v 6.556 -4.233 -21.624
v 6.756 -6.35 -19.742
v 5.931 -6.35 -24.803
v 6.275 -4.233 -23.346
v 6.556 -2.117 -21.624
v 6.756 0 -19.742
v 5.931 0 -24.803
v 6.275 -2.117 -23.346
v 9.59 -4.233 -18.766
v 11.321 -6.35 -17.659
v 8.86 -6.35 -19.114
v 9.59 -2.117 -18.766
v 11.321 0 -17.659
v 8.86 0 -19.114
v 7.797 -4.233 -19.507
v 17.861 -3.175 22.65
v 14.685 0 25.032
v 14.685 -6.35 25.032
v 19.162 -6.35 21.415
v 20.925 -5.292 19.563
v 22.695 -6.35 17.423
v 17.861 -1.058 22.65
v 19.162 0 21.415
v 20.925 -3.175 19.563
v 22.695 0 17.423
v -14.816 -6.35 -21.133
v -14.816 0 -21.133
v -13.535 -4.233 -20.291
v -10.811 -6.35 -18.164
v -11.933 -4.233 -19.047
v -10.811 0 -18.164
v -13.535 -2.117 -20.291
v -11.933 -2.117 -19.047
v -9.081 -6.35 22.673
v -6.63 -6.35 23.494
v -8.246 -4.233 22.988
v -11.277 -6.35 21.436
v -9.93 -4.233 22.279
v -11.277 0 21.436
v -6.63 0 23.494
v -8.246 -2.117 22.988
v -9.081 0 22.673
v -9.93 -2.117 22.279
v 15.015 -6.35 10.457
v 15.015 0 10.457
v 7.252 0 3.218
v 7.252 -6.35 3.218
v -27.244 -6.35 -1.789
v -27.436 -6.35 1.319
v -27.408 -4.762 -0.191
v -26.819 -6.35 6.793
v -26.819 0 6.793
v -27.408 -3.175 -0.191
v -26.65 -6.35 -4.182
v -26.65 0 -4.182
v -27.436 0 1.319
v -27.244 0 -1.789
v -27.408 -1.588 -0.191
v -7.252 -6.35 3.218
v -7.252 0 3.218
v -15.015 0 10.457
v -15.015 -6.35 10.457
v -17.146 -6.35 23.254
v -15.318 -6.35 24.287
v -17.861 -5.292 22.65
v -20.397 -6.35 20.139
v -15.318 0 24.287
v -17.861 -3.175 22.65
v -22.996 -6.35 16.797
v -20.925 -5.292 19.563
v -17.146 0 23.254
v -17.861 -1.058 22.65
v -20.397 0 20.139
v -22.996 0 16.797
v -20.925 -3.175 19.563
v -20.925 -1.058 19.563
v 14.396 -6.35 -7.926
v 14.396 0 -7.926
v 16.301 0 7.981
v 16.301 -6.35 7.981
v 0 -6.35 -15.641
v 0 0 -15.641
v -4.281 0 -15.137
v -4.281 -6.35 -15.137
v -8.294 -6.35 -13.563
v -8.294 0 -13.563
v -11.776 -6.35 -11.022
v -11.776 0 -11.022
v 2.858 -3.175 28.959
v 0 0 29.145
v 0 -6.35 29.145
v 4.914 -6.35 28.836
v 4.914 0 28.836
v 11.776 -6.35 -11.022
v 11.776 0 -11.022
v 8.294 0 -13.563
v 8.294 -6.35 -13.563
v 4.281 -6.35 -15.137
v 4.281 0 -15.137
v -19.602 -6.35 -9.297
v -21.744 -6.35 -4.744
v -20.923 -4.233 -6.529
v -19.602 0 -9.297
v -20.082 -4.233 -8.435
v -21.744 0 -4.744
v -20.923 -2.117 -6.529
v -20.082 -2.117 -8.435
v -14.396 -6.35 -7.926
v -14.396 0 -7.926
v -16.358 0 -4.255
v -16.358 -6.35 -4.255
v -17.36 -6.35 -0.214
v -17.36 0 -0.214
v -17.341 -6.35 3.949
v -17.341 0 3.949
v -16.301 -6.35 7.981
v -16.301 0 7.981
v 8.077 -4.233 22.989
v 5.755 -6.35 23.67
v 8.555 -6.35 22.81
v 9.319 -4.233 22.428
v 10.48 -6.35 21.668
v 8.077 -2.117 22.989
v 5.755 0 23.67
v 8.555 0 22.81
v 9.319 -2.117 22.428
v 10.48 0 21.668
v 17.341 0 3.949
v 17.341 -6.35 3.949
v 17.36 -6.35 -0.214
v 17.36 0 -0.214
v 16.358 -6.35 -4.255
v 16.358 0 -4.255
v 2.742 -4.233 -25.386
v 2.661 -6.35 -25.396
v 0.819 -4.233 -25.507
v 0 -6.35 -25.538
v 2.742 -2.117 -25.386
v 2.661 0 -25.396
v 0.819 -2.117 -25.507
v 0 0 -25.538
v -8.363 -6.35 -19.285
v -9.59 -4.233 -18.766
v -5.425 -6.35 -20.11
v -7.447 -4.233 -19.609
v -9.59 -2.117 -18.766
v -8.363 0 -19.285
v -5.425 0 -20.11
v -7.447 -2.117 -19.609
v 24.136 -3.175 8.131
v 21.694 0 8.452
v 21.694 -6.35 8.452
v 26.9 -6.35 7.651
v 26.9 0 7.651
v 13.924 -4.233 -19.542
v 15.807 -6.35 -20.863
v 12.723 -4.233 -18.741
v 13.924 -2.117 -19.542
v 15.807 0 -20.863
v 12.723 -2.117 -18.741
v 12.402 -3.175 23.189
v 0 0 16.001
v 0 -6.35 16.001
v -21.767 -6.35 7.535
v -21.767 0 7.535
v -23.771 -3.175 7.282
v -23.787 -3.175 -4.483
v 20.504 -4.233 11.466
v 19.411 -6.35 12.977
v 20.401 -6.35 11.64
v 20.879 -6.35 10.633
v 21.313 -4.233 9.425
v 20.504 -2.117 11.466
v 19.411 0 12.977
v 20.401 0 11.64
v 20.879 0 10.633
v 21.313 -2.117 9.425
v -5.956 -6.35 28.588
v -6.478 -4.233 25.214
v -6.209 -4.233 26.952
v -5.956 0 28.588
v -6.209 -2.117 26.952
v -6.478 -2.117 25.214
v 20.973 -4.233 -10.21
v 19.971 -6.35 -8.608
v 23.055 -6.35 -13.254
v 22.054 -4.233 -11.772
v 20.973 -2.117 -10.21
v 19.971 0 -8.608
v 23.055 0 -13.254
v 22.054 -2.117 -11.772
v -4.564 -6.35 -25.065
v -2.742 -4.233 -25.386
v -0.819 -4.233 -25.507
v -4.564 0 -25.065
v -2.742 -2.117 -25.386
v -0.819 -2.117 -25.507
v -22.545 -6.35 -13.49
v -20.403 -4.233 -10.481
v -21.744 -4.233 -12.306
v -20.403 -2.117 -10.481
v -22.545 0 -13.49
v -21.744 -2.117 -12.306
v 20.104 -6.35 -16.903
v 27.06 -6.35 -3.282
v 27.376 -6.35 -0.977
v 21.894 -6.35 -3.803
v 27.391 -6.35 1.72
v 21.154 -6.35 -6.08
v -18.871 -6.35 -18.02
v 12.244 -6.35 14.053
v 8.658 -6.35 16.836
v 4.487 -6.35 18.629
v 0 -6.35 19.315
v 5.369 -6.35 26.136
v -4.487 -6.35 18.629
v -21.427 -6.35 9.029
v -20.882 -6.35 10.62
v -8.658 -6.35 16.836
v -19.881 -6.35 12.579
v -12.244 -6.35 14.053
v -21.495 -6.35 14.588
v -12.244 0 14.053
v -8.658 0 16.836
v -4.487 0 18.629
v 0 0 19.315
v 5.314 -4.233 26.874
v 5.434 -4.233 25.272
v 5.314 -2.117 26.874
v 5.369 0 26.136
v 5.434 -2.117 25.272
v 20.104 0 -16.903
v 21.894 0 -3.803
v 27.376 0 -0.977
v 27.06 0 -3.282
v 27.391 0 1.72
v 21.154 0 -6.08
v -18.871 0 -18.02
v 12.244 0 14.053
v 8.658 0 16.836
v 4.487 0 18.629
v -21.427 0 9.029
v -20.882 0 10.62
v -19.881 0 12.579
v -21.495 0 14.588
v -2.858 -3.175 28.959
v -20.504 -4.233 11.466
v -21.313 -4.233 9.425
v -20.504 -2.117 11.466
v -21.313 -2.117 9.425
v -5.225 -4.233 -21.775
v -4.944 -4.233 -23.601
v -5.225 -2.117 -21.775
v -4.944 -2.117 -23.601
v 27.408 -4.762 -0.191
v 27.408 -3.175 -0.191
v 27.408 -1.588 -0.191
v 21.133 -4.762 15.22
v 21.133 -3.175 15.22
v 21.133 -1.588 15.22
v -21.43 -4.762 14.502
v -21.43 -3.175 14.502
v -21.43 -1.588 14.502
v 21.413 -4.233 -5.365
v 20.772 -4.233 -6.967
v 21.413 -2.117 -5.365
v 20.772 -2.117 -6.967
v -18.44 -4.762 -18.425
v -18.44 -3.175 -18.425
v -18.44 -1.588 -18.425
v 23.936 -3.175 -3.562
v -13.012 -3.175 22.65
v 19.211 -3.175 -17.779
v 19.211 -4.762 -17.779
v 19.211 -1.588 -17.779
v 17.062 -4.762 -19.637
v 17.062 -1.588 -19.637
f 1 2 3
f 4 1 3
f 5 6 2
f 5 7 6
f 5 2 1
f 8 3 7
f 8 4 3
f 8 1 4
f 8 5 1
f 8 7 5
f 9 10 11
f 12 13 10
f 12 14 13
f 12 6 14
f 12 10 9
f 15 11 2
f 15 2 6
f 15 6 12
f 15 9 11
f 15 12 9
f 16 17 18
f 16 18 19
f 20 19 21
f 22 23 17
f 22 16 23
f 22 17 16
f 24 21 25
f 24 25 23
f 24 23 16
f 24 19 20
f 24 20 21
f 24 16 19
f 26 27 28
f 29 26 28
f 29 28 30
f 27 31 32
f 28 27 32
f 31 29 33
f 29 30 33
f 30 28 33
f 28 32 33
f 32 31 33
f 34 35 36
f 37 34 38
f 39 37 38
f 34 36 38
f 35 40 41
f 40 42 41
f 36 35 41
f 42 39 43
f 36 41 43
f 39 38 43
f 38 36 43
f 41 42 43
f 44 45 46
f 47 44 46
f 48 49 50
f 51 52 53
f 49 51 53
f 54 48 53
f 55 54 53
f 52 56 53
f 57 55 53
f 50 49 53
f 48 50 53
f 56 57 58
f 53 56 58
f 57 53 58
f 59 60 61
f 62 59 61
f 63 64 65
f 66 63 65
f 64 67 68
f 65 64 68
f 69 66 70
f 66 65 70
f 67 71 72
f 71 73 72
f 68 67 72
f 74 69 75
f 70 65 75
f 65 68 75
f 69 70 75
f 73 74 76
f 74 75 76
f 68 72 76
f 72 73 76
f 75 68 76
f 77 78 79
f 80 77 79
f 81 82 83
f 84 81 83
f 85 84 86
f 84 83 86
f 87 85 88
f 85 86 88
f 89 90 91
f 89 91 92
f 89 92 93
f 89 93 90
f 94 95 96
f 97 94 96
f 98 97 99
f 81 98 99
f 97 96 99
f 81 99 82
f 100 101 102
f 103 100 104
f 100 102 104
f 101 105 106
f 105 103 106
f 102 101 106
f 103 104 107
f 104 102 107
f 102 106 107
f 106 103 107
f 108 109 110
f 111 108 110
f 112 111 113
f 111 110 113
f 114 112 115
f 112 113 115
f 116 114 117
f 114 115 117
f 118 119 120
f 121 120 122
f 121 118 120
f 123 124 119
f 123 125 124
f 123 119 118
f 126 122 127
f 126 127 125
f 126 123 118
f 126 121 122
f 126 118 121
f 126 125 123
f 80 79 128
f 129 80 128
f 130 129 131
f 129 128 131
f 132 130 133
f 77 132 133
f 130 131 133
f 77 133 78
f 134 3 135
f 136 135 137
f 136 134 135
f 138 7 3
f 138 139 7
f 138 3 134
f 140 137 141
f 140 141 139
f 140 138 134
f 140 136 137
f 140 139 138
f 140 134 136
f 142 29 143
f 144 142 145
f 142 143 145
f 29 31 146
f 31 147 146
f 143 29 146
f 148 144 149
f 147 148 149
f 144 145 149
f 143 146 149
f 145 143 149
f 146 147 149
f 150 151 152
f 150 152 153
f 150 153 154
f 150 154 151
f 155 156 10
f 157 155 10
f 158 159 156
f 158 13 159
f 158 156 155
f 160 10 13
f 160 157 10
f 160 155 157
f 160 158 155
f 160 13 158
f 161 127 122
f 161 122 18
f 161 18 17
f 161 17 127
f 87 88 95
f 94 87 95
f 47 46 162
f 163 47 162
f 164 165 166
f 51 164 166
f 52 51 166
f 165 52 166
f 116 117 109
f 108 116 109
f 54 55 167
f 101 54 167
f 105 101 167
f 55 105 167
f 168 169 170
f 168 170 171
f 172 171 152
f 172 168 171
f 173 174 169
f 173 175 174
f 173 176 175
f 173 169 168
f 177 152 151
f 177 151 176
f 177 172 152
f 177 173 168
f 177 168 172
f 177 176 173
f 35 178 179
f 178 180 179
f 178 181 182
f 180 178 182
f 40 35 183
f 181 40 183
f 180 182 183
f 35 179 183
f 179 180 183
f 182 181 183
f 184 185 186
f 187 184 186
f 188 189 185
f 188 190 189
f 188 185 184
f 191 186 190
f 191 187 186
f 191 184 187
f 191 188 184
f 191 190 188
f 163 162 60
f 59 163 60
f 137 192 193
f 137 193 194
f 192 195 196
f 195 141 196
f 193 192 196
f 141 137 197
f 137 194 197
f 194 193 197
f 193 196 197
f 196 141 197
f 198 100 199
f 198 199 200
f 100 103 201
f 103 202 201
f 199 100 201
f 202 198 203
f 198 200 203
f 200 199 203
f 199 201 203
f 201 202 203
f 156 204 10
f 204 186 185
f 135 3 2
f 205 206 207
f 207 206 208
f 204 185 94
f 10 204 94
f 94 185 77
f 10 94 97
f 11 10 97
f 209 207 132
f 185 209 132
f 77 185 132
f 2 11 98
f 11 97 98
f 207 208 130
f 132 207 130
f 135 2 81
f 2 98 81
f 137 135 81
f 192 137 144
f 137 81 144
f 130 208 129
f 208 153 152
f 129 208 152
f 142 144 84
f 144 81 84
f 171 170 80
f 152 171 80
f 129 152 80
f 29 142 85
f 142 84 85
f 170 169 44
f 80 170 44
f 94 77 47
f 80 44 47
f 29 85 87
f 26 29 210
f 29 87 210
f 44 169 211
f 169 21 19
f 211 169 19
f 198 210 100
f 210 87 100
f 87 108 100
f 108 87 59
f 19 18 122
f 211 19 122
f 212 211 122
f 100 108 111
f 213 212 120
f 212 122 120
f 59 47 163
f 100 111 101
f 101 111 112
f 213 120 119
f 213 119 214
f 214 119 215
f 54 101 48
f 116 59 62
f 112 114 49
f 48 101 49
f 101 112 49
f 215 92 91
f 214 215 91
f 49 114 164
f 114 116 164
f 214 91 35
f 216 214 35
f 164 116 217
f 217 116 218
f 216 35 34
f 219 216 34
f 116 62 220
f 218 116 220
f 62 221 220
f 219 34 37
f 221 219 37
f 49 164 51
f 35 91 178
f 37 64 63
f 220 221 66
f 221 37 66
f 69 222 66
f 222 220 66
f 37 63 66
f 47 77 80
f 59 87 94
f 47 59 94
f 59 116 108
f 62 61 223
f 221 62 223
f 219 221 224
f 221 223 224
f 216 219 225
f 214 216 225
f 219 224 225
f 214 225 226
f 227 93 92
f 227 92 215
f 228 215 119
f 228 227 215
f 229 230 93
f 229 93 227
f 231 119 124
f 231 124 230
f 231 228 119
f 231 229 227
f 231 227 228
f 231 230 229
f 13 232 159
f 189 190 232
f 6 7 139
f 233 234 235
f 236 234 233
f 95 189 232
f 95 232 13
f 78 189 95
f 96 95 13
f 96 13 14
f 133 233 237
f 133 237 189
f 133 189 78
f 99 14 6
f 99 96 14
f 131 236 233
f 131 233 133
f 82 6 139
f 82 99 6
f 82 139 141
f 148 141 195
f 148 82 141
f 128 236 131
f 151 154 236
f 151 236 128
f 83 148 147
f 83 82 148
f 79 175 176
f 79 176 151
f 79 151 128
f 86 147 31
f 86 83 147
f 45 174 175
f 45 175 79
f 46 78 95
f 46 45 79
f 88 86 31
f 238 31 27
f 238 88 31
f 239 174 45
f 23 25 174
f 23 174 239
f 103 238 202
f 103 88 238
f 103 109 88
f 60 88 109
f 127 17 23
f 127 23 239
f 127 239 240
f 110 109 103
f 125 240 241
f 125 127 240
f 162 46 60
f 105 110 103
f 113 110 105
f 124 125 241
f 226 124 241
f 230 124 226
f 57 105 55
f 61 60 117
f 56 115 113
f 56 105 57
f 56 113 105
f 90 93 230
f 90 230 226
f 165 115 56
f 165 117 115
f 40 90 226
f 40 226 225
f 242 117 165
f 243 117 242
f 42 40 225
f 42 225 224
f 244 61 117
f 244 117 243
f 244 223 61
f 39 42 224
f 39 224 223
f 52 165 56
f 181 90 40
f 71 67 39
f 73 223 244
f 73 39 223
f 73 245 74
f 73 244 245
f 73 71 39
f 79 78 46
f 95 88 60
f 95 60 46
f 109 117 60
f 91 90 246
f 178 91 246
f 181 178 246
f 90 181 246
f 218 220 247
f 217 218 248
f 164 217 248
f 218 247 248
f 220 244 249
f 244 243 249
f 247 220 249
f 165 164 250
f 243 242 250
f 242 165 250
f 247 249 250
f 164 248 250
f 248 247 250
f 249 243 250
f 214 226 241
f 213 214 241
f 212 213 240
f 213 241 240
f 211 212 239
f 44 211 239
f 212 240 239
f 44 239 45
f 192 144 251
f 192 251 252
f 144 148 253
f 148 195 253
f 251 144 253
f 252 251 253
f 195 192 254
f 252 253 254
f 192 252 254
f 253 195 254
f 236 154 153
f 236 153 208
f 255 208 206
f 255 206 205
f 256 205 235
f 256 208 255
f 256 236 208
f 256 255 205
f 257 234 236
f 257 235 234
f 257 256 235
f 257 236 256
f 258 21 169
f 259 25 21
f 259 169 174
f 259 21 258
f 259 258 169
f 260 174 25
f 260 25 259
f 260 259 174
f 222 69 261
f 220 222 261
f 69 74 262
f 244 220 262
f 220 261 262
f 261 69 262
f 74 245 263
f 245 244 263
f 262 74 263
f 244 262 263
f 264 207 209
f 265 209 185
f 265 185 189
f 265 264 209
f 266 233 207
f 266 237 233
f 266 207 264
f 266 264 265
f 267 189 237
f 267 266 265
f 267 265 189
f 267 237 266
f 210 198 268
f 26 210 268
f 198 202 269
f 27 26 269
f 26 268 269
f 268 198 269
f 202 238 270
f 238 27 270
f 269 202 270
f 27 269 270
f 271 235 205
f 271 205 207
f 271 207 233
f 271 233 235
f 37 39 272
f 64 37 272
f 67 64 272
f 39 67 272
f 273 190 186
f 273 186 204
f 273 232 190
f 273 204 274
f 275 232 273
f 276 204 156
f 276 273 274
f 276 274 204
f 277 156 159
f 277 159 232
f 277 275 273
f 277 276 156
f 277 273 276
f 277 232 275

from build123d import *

# Parameters (mm, degrees)
F1_DEPTH = 6.35


with BuildPart() as f1:
    # F0 (on Front) → F1 (new body)
    with BuildSketch(Plane.XZ):
        with BuildLine():
            add(Edge.make_bspline(
                [(0, 29.1454624385), (1.0437938543, 29.092111315), (2.9676615883, 28.9021353997), (3.9769254433, 28.960774908), (4.9135610461, 28.8361106068)],
                knots=[0, 0, 0, 0, 0.5411649205, 1, 1, 1, 1], degree=3))
            add(Edge.make_bspline(
                [(0, 29.1454624385), (-0.9437528923, 29.0972246788), (-2.8725435711, 28.9986389771), (-4.9138774721, 28.7269415704), (-5.9563913383, 28.5881850868)],
                knots=[0, 0, 0, 0, 0.4892977256, 1, 1, 1, 1], degree=3))
            add(Edge.make_bspline(
                [(-5.9563913383, 28.5881850868), (-6.0373155006, 28.0471445059), (-6.2016335657, 26.9485512193), (-6.5093200592, 25.2156363617), (-6.5898328104, 24.0659783815), (-6.62991032, 23.4937034547)],
                knots=[0, 0, 0, 0, 0.3276624402, 0.6653248753, 1, 1, 1, 1], degree=3))
            add(Edge.make_bspline(
                [(-6.62991032, 23.4937034547), (-7.1630712073, 23.3361625005), (-8.2499255604, 23.0150135266), (-9.9572225739, 22.336204538), (-10.8475304186, 21.7288015321), (-11.2771932036, 21.435668692)],
                knots=[0, 0, 0, 0, 0.3325381872, 0.6778827649, 1, 1, 1, 1], degree=3))
            add(Edge.make_bspline(
                [(-11.2771932036, 21.435668692), (-11.8350702765, 21.8249692799), (-13.0377139366, 22.6642041338), (-14.5223554917, 23.7203330679), (-15.3183080256, 24.2865495384)],
                knots=[0, 0, 0, 0, 0.4638756196, 1, 1, 1, 1], degree=3))
            add(Edge.make_bspline(
                [(-15.3183080256, 24.2865495384), (-15.7393330058, 24.0996279574), (-16.6177593429, 23.7096348514), (-17.8974724533, 22.6498262533), (-19.4217291693, 21.176610486), (-20.9120929279, 19.6036415161), (-22.2988027199, 17.9964793951), (-22.7815170567, 17.1662651554), (-22.9964256287, 16.7966466397)],
                knots=[0, 0, 0, 0, 0.1470342518, 0.3067721995, 0.488195784, 0.6741675209, 0.8549365796, 1, 1, 1, 1], degree=3))
            add(Edge.make_bspline(
                [(-22.9964256287, 16.7966466397), (-22.7827786963, 16.4290347992), (-22.3389569602, 15.6653724171), (-21.4374221971, 14.5295552957), (-20.4705705808, 13.2063534042), (-20.054743296, 12.7638344348), (-19.881401211, 12.5793656334)],
                knots=[0, 0, 0, 0, 0.2493452916, 0.5179801039, 0.7990648116, 1, 1, 1, 1], degree=3))
            add(Edge.make_bspline(
                [(-19.881401211, 12.5793656334), (-20.0846392768, 12.2431799217), (-20.5544790803, 11.4659956468), (-21.3840934518, 9.4147652747), (-21.6421566332, 8.1490557932), (-21.7672549188, 7.5354925357)],
                knots=[0, 0, 0, 0, 0.2820132239, 0.6519499051, 1, 1, 1, 1], degree=3))
            add(Edge.make_bspline(
                [(-21.7672549188, 7.5354925357), (-22.4007651503, 7.4617805928), (-23.8174591466, 7.2969414761), (-25.7501887359, 6.9725709243), (-26.8186498433, 6.7932507955)],
                knots=[0, 0, 0, 0, 0.4471750661, 1, 1, 1, 1], degree=3))
            add(Edge.make_bspline(
                [(-26.8186498433, 6.7932507955), (-27.0150206584, 5.7106997675), (-27.4153649769, 3.5036856882), (-27.487576028, -0.1420278505), (-27.1724841229, -2.4576482164), (-26.8158489096, -3.6351135415), (-26.6502574086, -4.1818297468)],
                knots=[0, 0, 0, 0, 0.2787464784, 0.5682848997, 0.7995476925, 1, 1, 1, 1], degree=3))
            add(Edge.make_bspline(
                [(-26.6502574086, -4.1818297468), (-25.6482524067, -4.283882262), (-23.7991424402, -4.4630401598), (-22.4348870789, -4.6582824608), (-21.7444170266, -4.7435350716)],
                knots=[0, 0, 0, 0, 0.5418119861, 1, 1, 1, 1], degree=3))
            add(Edge.make_bspline(
                [(-21.7444170266, -4.7435350716), (-21.5301513936, -5.3239807478), (-20.8973837805, -6.4748096374), (-20.1371624634, -8.4217377612), (-19.7523654924, -9.0446974596), (-19.6018647403, -9.2973606661)],
                knots=[0, 0, 0, 0, 0.3651712445, 0.7411436265, 1, 1, 1, 1], degree=3))
            add(Edge.make_bspline(
                [(-19.6018647403, -9.2973606661), (-19.8557043075, -9.6575667806), (-20.3660684195, -10.5039588883), (-21.8038157451, -12.2702435785), (-22.2412676268, -13.1592855453), (-22.545369342, -13.4900901467)],
                knots=[0, 0, 0, 0, 0.3068371792, 0.6931629329, 1, 1, 1, 1], degree=3))
            add(Edge.make_bspline(
                [(-22.545369342, -13.4900901467), (-22.0940668912, -14.1195692007), (-21.0761124198, -15.5394175013), (-18.599436748, -18.5356038568), (-16.1004309615, -20.144341254), (-15.1952966672, -20.8413432762), (-14.8161659017, -21.133294329)],
                knots=[0, 0, 0, 0, 0.2417916314, 0.5453834162, 0.8095761762, 1, 1, 1, 1], degree=3))
            add(Edge.make_bspline(
                [(-14.8161659017, -21.133294329), (-14.4035545557, -20.8762121849), (-13.5164676765, -20.3235027183), (-11.938800627, -19.0453001605), (-11.1645796897, -18.4402777711), (-10.8113959432, -18.1642789394)],
                knots=[0, 0, 0, 0, 0.321074097, 0.6902878978, 1, 1, 1, 1], degree=3))
            add(Edge.make_bspline(
                [(-10.8113959432, -18.1642789394), (-10.4377997552, -18.356428426), (-9.578418285, -18.7984289431), (-7.4377889326, -19.6846188267), (-6.0846706958, -19.9707083991), (-5.4249824025, -20.1101861894)],
                knots=[0, 0, 0, 0, 0.2826999765, 0.6502933629, 1, 1, 1, 1], degree=3))
            add(Edge.make_bspline(
                [(-5.4249824025, -20.1101861894), (-5.3610155769, -20.6541840451), (-5.2299201103, -21.7690690184), (-4.9868161685, -23.6038968225), (-4.700150649, -24.5945667946), (-4.5639569871, -25.0652302057)],
                knots=[0, 0, 0, 0, 0.3334135521, 0.6833073978, 1, 1, 1, 1], degree=3))
            add(Edge.make_bspline(
                [(-4.5639569871, -25.0652302057), (-4.0036224765, -25.1967327146), (-2.7763592192, -25.4257120062), (-0.8901785241, -25.5282377636), (-0.1930272857, -25.4964662667), (0, -25.538245216)],
                knots=[0, 0, 0, 0, 0.3722930601, 0.7521386883, 1, 1, 1, 1], degree=3))
            add(Edge.make_bspline(
                [(5.9308572672, -24.8031578958), (5.2689139487, -24.9585065411), (2.6790443076, -25.4731548763), (0.9559764293, -25.5156687774), (0.1722671255, -25.5009596091), (0, -25.538245216)],
                knots=[0, 0, 0, 0, 0.4398031871, 0.7787962694, 1, 1, 1, 1], degree=3))
            add(Edge.make_bspline(
                [(6.7557585426, -19.7417400777), (6.688428351, -20.314341258), (6.5813657899, -21.6402709566), (6.2935524423, -23.3259978833), (6.0650862164, -24.3392842162), (5.9308572672, -24.8031578958)],
                knots=[0, 0, 0, 0, 0.350944386, 0.6878759656, 1, 1, 1, 1], degree=3))
            add(Edge.make_bspline(
                [(11.3211954013, -17.6592599601), (10.8213650634, -17.9163346998), (9.7584232665, -18.866459568), (7.3118023933, -19.6875722622), (7.1734705952, -19.6534232853), (6.7557585426, -19.7417400777)],
                knots=[0, 0, 0, 0, 0.3782212702, 0.7785671222, 1, 1, 1, 1], degree=3))
            add(Edge.make_bspline(
                [(15.8065371215, -20.8630748093), (15.3251736992, -20.56315591), (13.8665011648, -19.4558100421), (12.7789681935, -18.8303028026), (11.6959509508, -17.9521162845), (11.3211954013, -17.6592599601)],
                knots=[0, 0, 0, 0, 0.3745736215, 0.6713712616, 1, 1, 1, 1], degree=3))
            add(Edge.make_bspline(
                [(23.0551678687, -13.2540129125), (22.5634664887, -13.9398406075), (21.2969886908, -15.5947202126), (19.3865031013, -17.7631830268), (16.5740495299, -19.9562511424), (16.1467053643, -20.6011269916), (15.8065371215, -20.8630748093)],
                knots=[0, 0, 0, 0, 0.2634359256, 0.5400288837, 0.8291456578, 1, 1, 1, 1], degree=3))
            add(Edge.make_bspline(
                [(19.9714973569, -8.6084809154), (20.2495023641, -9.0029785287), (21.011999566, -10.2999652272), (21.9169868652, -11.70396495), (23.0144243441, -12.8465890354), (23.0551678687, -13.2540129125)],
                knots=[0, 0, 0, 0, 0.3360479736, 0.6730359544, 1, 1, 1, 1], degree=3))
            add(Edge.make_bspline(
                [(21.8937862664, -3.8027581759), (21.7035819832, -4.3180216468), (21.4474562337, -5.4083164729), (20.8218480912, -6.8864413809), (20.1707750268, -8.2739301949), (19.9714973569, -8.6084809154)],
                knots=[0, 0, 0, 0, 0.3241636739, 0.6572489225, 1, 1, 1, 1], degree=3))
            add(Edge.make_bspline(
                [(27.0599387586, -3.2821381465), (26.0380611154, -3.3862146566), (23.9300050389, -3.5368732847), (22.5680630159, -3.7195049586), (21.8937862664, -3.8027581759)],
                knots=[0, 0, 0, 0, 0.5525576762, 1, 1, 1, 1], degree=3))
            add(Edge.make_bspline(
                [(26.8997494131, 7.65088154), (27.1242064519, 6.4134970641), (27.3633651924, 3.5787653193), (27.439365489, -0.1607865373), (27.3473887116, -1.3791971203), (27.2348576602, -2.7046266344), (27.0599387586, -3.2821381465)],
                knots=[0, 0, 0, 0, 0.3186146021, 0.6147483075, 0.7882566602, 1, 1, 1, 1], degree=3))
            add(Edge.make_bspline(
                [(21.693546325, 8.4518361837), (22.3789499151, 8.3720862005), (24.304576792, 8.0593863157), (25.7784109563, 8.0113112926), (26.8997494131, 7.65088154)],
                knots=[0, 0, 0, 0, 0.4838049656, 1, 1, 1, 1], degree=3))
            add(Edge.make_bspline(
                [(19.4108262658, 12.9772247747), (19.6651851258, 12.5564777356), (20.683890471, 11.5867833538), (21.2529723436, 9.3224373945), (21.598601005, 8.9175097099), (21.693546325, 8.4518361837)],
                knots=[0, 0, 0, 0, 0.352948459, 0.7358418825, 1, 1, 1, 1], degree=3))
            add(Edge.make_bspline(
                [(22.6947367191, 17.4225196242), (22.4413821761, 16.9865848375), (21.5126588146, 15.8983840367), (21.1662670639, 15.2110067721), (20.3757160555, 14.255874727), (19.6432982612, 13.2246189971), (19.4108262658, 12.9772247747)],
                knots=[0, 0, 0, 0, 0.2956876643, 0.4893521651, 0.730522428, 1, 1, 1, 1], degree=3))
            add(Edge.make_bspline(
                [(14.6851977333, 25.0315796584), (15.2235059004, 24.7925881059), (16.6051459422, 23.5783271475), (17.8795272181, 22.7063806851), (19.3795101389, 21.1942951621), (20.9703035578, 19.602131019), (21.6083627989, 18.5856925536), (22.4685614557, 17.8115155791), (22.6947367191, 17.4225196242)],
                knots=[0, 0, 0, 0, 0.187992975, 0.3461125439, 0.5256980424, 0.7097856138, 0.8473315558, 1, 1, 1, 1], degree=3))
            add(Edge.make_bspline(
                [(10.480189696, 21.667573601), (11.0545698354, 22.0683904419), (12.4507201039, 23.2125696165), (13.9096179326, 24.4798557319), (14.6851977333, 25.0315796584)],
                knots=[0, 0, 0, 0, 0.4775979441, 1, 1, 1, 1], degree=3))
            add(Edge.make_bspline(
                [(5.7545625605, 23.6699581146), (6.3939497446, 23.4810289011), (8.1266642272, 23.0343498509), (9.3072746554, 22.4757967175), (10.0773108512, 21.9424333843), (10.480189696, 21.667573601)],
                knots=[0, 0, 0, 0, 0.3987926726, 0.6979626253, 1, 1, 1, 1], degree=3))
            add(Edge.make_bspline(
                [(4.9135610461, 28.8361106068), (5.0018057445, 28.2461265834), (5.4317244157, 26.8651315663), (5.3164898818, 25.2755494168), (5.7159192748, 24.2217534645), (5.7545625605, 23.6699581146)],
                knots=[0, 0, 0, 0, 0.3573033365, 0.677301645, 1, 1, 1, 1], degree=3))
        make_face()
        with BuildLine():
            ThreePointArc((-14.3957585096, -7.9261912033), (-17.36002773, -0.2137465224), (-16.3007583469, 7.9805590212))
            Line((-16.3007583469, 7.9805590212), (-14.3957585096, -7.9261912033))
        make_face(mode=Mode.SUBTRACT)
        with BuildLine():
            ThreePointArc((0, -15.6414415687), (-6.3381965817, -14.4787839931), (-11.7763839662, -11.0218161717))
            Line((-11.7763839662, -11.0218161717), (0, -11.0218161717))
            Line((0, -11.0218161717), (11.7763839662, -11.0218161717))
            ThreePointArc((11.7763839662, -11.0218161717), (6.3381965817, -14.4787839931), (0, -15.6414415687))
        make_face(mode=Mode.SUBTRACT)
        with BuildLine():
            Line((14.3957585096, -7.9261912033), (16.3007583469, 7.9805590212))
            ThreePointArc((16.3007583469, 7.9805590212), (17.36002773, -0.2137465224), (14.3957585096, -7.9261912033))
        make_face(mode=Mode.SUBTRACT)
        with BuildLine():
            Line((7.2520091198, 3.2180584967), (0, 16.0014592111))
            Line((0, 16.0014592111), (-7.2520091198, 3.2180584967))
            Line((-7.2520091198, 3.2180584967), (-15.0148840621, 10.4570584372))
            ThreePointArc((-15.0148840621, 10.4570584372), (-8.6577731267, 16.8360140302), (0, 19.3153079599))
            ThreePointArc((0, 19.3153079599), (8.6577731267, 16.8360140302), (15.0148840621, 10.4570584372))
            Line((15.0148840621, 10.4570584372), (7.2520091198, 3.2180584967))
        make_face(mode=Mode.SUBTRACT)
    extrude(amount=F1_DEPTH)


solid = f1.part
